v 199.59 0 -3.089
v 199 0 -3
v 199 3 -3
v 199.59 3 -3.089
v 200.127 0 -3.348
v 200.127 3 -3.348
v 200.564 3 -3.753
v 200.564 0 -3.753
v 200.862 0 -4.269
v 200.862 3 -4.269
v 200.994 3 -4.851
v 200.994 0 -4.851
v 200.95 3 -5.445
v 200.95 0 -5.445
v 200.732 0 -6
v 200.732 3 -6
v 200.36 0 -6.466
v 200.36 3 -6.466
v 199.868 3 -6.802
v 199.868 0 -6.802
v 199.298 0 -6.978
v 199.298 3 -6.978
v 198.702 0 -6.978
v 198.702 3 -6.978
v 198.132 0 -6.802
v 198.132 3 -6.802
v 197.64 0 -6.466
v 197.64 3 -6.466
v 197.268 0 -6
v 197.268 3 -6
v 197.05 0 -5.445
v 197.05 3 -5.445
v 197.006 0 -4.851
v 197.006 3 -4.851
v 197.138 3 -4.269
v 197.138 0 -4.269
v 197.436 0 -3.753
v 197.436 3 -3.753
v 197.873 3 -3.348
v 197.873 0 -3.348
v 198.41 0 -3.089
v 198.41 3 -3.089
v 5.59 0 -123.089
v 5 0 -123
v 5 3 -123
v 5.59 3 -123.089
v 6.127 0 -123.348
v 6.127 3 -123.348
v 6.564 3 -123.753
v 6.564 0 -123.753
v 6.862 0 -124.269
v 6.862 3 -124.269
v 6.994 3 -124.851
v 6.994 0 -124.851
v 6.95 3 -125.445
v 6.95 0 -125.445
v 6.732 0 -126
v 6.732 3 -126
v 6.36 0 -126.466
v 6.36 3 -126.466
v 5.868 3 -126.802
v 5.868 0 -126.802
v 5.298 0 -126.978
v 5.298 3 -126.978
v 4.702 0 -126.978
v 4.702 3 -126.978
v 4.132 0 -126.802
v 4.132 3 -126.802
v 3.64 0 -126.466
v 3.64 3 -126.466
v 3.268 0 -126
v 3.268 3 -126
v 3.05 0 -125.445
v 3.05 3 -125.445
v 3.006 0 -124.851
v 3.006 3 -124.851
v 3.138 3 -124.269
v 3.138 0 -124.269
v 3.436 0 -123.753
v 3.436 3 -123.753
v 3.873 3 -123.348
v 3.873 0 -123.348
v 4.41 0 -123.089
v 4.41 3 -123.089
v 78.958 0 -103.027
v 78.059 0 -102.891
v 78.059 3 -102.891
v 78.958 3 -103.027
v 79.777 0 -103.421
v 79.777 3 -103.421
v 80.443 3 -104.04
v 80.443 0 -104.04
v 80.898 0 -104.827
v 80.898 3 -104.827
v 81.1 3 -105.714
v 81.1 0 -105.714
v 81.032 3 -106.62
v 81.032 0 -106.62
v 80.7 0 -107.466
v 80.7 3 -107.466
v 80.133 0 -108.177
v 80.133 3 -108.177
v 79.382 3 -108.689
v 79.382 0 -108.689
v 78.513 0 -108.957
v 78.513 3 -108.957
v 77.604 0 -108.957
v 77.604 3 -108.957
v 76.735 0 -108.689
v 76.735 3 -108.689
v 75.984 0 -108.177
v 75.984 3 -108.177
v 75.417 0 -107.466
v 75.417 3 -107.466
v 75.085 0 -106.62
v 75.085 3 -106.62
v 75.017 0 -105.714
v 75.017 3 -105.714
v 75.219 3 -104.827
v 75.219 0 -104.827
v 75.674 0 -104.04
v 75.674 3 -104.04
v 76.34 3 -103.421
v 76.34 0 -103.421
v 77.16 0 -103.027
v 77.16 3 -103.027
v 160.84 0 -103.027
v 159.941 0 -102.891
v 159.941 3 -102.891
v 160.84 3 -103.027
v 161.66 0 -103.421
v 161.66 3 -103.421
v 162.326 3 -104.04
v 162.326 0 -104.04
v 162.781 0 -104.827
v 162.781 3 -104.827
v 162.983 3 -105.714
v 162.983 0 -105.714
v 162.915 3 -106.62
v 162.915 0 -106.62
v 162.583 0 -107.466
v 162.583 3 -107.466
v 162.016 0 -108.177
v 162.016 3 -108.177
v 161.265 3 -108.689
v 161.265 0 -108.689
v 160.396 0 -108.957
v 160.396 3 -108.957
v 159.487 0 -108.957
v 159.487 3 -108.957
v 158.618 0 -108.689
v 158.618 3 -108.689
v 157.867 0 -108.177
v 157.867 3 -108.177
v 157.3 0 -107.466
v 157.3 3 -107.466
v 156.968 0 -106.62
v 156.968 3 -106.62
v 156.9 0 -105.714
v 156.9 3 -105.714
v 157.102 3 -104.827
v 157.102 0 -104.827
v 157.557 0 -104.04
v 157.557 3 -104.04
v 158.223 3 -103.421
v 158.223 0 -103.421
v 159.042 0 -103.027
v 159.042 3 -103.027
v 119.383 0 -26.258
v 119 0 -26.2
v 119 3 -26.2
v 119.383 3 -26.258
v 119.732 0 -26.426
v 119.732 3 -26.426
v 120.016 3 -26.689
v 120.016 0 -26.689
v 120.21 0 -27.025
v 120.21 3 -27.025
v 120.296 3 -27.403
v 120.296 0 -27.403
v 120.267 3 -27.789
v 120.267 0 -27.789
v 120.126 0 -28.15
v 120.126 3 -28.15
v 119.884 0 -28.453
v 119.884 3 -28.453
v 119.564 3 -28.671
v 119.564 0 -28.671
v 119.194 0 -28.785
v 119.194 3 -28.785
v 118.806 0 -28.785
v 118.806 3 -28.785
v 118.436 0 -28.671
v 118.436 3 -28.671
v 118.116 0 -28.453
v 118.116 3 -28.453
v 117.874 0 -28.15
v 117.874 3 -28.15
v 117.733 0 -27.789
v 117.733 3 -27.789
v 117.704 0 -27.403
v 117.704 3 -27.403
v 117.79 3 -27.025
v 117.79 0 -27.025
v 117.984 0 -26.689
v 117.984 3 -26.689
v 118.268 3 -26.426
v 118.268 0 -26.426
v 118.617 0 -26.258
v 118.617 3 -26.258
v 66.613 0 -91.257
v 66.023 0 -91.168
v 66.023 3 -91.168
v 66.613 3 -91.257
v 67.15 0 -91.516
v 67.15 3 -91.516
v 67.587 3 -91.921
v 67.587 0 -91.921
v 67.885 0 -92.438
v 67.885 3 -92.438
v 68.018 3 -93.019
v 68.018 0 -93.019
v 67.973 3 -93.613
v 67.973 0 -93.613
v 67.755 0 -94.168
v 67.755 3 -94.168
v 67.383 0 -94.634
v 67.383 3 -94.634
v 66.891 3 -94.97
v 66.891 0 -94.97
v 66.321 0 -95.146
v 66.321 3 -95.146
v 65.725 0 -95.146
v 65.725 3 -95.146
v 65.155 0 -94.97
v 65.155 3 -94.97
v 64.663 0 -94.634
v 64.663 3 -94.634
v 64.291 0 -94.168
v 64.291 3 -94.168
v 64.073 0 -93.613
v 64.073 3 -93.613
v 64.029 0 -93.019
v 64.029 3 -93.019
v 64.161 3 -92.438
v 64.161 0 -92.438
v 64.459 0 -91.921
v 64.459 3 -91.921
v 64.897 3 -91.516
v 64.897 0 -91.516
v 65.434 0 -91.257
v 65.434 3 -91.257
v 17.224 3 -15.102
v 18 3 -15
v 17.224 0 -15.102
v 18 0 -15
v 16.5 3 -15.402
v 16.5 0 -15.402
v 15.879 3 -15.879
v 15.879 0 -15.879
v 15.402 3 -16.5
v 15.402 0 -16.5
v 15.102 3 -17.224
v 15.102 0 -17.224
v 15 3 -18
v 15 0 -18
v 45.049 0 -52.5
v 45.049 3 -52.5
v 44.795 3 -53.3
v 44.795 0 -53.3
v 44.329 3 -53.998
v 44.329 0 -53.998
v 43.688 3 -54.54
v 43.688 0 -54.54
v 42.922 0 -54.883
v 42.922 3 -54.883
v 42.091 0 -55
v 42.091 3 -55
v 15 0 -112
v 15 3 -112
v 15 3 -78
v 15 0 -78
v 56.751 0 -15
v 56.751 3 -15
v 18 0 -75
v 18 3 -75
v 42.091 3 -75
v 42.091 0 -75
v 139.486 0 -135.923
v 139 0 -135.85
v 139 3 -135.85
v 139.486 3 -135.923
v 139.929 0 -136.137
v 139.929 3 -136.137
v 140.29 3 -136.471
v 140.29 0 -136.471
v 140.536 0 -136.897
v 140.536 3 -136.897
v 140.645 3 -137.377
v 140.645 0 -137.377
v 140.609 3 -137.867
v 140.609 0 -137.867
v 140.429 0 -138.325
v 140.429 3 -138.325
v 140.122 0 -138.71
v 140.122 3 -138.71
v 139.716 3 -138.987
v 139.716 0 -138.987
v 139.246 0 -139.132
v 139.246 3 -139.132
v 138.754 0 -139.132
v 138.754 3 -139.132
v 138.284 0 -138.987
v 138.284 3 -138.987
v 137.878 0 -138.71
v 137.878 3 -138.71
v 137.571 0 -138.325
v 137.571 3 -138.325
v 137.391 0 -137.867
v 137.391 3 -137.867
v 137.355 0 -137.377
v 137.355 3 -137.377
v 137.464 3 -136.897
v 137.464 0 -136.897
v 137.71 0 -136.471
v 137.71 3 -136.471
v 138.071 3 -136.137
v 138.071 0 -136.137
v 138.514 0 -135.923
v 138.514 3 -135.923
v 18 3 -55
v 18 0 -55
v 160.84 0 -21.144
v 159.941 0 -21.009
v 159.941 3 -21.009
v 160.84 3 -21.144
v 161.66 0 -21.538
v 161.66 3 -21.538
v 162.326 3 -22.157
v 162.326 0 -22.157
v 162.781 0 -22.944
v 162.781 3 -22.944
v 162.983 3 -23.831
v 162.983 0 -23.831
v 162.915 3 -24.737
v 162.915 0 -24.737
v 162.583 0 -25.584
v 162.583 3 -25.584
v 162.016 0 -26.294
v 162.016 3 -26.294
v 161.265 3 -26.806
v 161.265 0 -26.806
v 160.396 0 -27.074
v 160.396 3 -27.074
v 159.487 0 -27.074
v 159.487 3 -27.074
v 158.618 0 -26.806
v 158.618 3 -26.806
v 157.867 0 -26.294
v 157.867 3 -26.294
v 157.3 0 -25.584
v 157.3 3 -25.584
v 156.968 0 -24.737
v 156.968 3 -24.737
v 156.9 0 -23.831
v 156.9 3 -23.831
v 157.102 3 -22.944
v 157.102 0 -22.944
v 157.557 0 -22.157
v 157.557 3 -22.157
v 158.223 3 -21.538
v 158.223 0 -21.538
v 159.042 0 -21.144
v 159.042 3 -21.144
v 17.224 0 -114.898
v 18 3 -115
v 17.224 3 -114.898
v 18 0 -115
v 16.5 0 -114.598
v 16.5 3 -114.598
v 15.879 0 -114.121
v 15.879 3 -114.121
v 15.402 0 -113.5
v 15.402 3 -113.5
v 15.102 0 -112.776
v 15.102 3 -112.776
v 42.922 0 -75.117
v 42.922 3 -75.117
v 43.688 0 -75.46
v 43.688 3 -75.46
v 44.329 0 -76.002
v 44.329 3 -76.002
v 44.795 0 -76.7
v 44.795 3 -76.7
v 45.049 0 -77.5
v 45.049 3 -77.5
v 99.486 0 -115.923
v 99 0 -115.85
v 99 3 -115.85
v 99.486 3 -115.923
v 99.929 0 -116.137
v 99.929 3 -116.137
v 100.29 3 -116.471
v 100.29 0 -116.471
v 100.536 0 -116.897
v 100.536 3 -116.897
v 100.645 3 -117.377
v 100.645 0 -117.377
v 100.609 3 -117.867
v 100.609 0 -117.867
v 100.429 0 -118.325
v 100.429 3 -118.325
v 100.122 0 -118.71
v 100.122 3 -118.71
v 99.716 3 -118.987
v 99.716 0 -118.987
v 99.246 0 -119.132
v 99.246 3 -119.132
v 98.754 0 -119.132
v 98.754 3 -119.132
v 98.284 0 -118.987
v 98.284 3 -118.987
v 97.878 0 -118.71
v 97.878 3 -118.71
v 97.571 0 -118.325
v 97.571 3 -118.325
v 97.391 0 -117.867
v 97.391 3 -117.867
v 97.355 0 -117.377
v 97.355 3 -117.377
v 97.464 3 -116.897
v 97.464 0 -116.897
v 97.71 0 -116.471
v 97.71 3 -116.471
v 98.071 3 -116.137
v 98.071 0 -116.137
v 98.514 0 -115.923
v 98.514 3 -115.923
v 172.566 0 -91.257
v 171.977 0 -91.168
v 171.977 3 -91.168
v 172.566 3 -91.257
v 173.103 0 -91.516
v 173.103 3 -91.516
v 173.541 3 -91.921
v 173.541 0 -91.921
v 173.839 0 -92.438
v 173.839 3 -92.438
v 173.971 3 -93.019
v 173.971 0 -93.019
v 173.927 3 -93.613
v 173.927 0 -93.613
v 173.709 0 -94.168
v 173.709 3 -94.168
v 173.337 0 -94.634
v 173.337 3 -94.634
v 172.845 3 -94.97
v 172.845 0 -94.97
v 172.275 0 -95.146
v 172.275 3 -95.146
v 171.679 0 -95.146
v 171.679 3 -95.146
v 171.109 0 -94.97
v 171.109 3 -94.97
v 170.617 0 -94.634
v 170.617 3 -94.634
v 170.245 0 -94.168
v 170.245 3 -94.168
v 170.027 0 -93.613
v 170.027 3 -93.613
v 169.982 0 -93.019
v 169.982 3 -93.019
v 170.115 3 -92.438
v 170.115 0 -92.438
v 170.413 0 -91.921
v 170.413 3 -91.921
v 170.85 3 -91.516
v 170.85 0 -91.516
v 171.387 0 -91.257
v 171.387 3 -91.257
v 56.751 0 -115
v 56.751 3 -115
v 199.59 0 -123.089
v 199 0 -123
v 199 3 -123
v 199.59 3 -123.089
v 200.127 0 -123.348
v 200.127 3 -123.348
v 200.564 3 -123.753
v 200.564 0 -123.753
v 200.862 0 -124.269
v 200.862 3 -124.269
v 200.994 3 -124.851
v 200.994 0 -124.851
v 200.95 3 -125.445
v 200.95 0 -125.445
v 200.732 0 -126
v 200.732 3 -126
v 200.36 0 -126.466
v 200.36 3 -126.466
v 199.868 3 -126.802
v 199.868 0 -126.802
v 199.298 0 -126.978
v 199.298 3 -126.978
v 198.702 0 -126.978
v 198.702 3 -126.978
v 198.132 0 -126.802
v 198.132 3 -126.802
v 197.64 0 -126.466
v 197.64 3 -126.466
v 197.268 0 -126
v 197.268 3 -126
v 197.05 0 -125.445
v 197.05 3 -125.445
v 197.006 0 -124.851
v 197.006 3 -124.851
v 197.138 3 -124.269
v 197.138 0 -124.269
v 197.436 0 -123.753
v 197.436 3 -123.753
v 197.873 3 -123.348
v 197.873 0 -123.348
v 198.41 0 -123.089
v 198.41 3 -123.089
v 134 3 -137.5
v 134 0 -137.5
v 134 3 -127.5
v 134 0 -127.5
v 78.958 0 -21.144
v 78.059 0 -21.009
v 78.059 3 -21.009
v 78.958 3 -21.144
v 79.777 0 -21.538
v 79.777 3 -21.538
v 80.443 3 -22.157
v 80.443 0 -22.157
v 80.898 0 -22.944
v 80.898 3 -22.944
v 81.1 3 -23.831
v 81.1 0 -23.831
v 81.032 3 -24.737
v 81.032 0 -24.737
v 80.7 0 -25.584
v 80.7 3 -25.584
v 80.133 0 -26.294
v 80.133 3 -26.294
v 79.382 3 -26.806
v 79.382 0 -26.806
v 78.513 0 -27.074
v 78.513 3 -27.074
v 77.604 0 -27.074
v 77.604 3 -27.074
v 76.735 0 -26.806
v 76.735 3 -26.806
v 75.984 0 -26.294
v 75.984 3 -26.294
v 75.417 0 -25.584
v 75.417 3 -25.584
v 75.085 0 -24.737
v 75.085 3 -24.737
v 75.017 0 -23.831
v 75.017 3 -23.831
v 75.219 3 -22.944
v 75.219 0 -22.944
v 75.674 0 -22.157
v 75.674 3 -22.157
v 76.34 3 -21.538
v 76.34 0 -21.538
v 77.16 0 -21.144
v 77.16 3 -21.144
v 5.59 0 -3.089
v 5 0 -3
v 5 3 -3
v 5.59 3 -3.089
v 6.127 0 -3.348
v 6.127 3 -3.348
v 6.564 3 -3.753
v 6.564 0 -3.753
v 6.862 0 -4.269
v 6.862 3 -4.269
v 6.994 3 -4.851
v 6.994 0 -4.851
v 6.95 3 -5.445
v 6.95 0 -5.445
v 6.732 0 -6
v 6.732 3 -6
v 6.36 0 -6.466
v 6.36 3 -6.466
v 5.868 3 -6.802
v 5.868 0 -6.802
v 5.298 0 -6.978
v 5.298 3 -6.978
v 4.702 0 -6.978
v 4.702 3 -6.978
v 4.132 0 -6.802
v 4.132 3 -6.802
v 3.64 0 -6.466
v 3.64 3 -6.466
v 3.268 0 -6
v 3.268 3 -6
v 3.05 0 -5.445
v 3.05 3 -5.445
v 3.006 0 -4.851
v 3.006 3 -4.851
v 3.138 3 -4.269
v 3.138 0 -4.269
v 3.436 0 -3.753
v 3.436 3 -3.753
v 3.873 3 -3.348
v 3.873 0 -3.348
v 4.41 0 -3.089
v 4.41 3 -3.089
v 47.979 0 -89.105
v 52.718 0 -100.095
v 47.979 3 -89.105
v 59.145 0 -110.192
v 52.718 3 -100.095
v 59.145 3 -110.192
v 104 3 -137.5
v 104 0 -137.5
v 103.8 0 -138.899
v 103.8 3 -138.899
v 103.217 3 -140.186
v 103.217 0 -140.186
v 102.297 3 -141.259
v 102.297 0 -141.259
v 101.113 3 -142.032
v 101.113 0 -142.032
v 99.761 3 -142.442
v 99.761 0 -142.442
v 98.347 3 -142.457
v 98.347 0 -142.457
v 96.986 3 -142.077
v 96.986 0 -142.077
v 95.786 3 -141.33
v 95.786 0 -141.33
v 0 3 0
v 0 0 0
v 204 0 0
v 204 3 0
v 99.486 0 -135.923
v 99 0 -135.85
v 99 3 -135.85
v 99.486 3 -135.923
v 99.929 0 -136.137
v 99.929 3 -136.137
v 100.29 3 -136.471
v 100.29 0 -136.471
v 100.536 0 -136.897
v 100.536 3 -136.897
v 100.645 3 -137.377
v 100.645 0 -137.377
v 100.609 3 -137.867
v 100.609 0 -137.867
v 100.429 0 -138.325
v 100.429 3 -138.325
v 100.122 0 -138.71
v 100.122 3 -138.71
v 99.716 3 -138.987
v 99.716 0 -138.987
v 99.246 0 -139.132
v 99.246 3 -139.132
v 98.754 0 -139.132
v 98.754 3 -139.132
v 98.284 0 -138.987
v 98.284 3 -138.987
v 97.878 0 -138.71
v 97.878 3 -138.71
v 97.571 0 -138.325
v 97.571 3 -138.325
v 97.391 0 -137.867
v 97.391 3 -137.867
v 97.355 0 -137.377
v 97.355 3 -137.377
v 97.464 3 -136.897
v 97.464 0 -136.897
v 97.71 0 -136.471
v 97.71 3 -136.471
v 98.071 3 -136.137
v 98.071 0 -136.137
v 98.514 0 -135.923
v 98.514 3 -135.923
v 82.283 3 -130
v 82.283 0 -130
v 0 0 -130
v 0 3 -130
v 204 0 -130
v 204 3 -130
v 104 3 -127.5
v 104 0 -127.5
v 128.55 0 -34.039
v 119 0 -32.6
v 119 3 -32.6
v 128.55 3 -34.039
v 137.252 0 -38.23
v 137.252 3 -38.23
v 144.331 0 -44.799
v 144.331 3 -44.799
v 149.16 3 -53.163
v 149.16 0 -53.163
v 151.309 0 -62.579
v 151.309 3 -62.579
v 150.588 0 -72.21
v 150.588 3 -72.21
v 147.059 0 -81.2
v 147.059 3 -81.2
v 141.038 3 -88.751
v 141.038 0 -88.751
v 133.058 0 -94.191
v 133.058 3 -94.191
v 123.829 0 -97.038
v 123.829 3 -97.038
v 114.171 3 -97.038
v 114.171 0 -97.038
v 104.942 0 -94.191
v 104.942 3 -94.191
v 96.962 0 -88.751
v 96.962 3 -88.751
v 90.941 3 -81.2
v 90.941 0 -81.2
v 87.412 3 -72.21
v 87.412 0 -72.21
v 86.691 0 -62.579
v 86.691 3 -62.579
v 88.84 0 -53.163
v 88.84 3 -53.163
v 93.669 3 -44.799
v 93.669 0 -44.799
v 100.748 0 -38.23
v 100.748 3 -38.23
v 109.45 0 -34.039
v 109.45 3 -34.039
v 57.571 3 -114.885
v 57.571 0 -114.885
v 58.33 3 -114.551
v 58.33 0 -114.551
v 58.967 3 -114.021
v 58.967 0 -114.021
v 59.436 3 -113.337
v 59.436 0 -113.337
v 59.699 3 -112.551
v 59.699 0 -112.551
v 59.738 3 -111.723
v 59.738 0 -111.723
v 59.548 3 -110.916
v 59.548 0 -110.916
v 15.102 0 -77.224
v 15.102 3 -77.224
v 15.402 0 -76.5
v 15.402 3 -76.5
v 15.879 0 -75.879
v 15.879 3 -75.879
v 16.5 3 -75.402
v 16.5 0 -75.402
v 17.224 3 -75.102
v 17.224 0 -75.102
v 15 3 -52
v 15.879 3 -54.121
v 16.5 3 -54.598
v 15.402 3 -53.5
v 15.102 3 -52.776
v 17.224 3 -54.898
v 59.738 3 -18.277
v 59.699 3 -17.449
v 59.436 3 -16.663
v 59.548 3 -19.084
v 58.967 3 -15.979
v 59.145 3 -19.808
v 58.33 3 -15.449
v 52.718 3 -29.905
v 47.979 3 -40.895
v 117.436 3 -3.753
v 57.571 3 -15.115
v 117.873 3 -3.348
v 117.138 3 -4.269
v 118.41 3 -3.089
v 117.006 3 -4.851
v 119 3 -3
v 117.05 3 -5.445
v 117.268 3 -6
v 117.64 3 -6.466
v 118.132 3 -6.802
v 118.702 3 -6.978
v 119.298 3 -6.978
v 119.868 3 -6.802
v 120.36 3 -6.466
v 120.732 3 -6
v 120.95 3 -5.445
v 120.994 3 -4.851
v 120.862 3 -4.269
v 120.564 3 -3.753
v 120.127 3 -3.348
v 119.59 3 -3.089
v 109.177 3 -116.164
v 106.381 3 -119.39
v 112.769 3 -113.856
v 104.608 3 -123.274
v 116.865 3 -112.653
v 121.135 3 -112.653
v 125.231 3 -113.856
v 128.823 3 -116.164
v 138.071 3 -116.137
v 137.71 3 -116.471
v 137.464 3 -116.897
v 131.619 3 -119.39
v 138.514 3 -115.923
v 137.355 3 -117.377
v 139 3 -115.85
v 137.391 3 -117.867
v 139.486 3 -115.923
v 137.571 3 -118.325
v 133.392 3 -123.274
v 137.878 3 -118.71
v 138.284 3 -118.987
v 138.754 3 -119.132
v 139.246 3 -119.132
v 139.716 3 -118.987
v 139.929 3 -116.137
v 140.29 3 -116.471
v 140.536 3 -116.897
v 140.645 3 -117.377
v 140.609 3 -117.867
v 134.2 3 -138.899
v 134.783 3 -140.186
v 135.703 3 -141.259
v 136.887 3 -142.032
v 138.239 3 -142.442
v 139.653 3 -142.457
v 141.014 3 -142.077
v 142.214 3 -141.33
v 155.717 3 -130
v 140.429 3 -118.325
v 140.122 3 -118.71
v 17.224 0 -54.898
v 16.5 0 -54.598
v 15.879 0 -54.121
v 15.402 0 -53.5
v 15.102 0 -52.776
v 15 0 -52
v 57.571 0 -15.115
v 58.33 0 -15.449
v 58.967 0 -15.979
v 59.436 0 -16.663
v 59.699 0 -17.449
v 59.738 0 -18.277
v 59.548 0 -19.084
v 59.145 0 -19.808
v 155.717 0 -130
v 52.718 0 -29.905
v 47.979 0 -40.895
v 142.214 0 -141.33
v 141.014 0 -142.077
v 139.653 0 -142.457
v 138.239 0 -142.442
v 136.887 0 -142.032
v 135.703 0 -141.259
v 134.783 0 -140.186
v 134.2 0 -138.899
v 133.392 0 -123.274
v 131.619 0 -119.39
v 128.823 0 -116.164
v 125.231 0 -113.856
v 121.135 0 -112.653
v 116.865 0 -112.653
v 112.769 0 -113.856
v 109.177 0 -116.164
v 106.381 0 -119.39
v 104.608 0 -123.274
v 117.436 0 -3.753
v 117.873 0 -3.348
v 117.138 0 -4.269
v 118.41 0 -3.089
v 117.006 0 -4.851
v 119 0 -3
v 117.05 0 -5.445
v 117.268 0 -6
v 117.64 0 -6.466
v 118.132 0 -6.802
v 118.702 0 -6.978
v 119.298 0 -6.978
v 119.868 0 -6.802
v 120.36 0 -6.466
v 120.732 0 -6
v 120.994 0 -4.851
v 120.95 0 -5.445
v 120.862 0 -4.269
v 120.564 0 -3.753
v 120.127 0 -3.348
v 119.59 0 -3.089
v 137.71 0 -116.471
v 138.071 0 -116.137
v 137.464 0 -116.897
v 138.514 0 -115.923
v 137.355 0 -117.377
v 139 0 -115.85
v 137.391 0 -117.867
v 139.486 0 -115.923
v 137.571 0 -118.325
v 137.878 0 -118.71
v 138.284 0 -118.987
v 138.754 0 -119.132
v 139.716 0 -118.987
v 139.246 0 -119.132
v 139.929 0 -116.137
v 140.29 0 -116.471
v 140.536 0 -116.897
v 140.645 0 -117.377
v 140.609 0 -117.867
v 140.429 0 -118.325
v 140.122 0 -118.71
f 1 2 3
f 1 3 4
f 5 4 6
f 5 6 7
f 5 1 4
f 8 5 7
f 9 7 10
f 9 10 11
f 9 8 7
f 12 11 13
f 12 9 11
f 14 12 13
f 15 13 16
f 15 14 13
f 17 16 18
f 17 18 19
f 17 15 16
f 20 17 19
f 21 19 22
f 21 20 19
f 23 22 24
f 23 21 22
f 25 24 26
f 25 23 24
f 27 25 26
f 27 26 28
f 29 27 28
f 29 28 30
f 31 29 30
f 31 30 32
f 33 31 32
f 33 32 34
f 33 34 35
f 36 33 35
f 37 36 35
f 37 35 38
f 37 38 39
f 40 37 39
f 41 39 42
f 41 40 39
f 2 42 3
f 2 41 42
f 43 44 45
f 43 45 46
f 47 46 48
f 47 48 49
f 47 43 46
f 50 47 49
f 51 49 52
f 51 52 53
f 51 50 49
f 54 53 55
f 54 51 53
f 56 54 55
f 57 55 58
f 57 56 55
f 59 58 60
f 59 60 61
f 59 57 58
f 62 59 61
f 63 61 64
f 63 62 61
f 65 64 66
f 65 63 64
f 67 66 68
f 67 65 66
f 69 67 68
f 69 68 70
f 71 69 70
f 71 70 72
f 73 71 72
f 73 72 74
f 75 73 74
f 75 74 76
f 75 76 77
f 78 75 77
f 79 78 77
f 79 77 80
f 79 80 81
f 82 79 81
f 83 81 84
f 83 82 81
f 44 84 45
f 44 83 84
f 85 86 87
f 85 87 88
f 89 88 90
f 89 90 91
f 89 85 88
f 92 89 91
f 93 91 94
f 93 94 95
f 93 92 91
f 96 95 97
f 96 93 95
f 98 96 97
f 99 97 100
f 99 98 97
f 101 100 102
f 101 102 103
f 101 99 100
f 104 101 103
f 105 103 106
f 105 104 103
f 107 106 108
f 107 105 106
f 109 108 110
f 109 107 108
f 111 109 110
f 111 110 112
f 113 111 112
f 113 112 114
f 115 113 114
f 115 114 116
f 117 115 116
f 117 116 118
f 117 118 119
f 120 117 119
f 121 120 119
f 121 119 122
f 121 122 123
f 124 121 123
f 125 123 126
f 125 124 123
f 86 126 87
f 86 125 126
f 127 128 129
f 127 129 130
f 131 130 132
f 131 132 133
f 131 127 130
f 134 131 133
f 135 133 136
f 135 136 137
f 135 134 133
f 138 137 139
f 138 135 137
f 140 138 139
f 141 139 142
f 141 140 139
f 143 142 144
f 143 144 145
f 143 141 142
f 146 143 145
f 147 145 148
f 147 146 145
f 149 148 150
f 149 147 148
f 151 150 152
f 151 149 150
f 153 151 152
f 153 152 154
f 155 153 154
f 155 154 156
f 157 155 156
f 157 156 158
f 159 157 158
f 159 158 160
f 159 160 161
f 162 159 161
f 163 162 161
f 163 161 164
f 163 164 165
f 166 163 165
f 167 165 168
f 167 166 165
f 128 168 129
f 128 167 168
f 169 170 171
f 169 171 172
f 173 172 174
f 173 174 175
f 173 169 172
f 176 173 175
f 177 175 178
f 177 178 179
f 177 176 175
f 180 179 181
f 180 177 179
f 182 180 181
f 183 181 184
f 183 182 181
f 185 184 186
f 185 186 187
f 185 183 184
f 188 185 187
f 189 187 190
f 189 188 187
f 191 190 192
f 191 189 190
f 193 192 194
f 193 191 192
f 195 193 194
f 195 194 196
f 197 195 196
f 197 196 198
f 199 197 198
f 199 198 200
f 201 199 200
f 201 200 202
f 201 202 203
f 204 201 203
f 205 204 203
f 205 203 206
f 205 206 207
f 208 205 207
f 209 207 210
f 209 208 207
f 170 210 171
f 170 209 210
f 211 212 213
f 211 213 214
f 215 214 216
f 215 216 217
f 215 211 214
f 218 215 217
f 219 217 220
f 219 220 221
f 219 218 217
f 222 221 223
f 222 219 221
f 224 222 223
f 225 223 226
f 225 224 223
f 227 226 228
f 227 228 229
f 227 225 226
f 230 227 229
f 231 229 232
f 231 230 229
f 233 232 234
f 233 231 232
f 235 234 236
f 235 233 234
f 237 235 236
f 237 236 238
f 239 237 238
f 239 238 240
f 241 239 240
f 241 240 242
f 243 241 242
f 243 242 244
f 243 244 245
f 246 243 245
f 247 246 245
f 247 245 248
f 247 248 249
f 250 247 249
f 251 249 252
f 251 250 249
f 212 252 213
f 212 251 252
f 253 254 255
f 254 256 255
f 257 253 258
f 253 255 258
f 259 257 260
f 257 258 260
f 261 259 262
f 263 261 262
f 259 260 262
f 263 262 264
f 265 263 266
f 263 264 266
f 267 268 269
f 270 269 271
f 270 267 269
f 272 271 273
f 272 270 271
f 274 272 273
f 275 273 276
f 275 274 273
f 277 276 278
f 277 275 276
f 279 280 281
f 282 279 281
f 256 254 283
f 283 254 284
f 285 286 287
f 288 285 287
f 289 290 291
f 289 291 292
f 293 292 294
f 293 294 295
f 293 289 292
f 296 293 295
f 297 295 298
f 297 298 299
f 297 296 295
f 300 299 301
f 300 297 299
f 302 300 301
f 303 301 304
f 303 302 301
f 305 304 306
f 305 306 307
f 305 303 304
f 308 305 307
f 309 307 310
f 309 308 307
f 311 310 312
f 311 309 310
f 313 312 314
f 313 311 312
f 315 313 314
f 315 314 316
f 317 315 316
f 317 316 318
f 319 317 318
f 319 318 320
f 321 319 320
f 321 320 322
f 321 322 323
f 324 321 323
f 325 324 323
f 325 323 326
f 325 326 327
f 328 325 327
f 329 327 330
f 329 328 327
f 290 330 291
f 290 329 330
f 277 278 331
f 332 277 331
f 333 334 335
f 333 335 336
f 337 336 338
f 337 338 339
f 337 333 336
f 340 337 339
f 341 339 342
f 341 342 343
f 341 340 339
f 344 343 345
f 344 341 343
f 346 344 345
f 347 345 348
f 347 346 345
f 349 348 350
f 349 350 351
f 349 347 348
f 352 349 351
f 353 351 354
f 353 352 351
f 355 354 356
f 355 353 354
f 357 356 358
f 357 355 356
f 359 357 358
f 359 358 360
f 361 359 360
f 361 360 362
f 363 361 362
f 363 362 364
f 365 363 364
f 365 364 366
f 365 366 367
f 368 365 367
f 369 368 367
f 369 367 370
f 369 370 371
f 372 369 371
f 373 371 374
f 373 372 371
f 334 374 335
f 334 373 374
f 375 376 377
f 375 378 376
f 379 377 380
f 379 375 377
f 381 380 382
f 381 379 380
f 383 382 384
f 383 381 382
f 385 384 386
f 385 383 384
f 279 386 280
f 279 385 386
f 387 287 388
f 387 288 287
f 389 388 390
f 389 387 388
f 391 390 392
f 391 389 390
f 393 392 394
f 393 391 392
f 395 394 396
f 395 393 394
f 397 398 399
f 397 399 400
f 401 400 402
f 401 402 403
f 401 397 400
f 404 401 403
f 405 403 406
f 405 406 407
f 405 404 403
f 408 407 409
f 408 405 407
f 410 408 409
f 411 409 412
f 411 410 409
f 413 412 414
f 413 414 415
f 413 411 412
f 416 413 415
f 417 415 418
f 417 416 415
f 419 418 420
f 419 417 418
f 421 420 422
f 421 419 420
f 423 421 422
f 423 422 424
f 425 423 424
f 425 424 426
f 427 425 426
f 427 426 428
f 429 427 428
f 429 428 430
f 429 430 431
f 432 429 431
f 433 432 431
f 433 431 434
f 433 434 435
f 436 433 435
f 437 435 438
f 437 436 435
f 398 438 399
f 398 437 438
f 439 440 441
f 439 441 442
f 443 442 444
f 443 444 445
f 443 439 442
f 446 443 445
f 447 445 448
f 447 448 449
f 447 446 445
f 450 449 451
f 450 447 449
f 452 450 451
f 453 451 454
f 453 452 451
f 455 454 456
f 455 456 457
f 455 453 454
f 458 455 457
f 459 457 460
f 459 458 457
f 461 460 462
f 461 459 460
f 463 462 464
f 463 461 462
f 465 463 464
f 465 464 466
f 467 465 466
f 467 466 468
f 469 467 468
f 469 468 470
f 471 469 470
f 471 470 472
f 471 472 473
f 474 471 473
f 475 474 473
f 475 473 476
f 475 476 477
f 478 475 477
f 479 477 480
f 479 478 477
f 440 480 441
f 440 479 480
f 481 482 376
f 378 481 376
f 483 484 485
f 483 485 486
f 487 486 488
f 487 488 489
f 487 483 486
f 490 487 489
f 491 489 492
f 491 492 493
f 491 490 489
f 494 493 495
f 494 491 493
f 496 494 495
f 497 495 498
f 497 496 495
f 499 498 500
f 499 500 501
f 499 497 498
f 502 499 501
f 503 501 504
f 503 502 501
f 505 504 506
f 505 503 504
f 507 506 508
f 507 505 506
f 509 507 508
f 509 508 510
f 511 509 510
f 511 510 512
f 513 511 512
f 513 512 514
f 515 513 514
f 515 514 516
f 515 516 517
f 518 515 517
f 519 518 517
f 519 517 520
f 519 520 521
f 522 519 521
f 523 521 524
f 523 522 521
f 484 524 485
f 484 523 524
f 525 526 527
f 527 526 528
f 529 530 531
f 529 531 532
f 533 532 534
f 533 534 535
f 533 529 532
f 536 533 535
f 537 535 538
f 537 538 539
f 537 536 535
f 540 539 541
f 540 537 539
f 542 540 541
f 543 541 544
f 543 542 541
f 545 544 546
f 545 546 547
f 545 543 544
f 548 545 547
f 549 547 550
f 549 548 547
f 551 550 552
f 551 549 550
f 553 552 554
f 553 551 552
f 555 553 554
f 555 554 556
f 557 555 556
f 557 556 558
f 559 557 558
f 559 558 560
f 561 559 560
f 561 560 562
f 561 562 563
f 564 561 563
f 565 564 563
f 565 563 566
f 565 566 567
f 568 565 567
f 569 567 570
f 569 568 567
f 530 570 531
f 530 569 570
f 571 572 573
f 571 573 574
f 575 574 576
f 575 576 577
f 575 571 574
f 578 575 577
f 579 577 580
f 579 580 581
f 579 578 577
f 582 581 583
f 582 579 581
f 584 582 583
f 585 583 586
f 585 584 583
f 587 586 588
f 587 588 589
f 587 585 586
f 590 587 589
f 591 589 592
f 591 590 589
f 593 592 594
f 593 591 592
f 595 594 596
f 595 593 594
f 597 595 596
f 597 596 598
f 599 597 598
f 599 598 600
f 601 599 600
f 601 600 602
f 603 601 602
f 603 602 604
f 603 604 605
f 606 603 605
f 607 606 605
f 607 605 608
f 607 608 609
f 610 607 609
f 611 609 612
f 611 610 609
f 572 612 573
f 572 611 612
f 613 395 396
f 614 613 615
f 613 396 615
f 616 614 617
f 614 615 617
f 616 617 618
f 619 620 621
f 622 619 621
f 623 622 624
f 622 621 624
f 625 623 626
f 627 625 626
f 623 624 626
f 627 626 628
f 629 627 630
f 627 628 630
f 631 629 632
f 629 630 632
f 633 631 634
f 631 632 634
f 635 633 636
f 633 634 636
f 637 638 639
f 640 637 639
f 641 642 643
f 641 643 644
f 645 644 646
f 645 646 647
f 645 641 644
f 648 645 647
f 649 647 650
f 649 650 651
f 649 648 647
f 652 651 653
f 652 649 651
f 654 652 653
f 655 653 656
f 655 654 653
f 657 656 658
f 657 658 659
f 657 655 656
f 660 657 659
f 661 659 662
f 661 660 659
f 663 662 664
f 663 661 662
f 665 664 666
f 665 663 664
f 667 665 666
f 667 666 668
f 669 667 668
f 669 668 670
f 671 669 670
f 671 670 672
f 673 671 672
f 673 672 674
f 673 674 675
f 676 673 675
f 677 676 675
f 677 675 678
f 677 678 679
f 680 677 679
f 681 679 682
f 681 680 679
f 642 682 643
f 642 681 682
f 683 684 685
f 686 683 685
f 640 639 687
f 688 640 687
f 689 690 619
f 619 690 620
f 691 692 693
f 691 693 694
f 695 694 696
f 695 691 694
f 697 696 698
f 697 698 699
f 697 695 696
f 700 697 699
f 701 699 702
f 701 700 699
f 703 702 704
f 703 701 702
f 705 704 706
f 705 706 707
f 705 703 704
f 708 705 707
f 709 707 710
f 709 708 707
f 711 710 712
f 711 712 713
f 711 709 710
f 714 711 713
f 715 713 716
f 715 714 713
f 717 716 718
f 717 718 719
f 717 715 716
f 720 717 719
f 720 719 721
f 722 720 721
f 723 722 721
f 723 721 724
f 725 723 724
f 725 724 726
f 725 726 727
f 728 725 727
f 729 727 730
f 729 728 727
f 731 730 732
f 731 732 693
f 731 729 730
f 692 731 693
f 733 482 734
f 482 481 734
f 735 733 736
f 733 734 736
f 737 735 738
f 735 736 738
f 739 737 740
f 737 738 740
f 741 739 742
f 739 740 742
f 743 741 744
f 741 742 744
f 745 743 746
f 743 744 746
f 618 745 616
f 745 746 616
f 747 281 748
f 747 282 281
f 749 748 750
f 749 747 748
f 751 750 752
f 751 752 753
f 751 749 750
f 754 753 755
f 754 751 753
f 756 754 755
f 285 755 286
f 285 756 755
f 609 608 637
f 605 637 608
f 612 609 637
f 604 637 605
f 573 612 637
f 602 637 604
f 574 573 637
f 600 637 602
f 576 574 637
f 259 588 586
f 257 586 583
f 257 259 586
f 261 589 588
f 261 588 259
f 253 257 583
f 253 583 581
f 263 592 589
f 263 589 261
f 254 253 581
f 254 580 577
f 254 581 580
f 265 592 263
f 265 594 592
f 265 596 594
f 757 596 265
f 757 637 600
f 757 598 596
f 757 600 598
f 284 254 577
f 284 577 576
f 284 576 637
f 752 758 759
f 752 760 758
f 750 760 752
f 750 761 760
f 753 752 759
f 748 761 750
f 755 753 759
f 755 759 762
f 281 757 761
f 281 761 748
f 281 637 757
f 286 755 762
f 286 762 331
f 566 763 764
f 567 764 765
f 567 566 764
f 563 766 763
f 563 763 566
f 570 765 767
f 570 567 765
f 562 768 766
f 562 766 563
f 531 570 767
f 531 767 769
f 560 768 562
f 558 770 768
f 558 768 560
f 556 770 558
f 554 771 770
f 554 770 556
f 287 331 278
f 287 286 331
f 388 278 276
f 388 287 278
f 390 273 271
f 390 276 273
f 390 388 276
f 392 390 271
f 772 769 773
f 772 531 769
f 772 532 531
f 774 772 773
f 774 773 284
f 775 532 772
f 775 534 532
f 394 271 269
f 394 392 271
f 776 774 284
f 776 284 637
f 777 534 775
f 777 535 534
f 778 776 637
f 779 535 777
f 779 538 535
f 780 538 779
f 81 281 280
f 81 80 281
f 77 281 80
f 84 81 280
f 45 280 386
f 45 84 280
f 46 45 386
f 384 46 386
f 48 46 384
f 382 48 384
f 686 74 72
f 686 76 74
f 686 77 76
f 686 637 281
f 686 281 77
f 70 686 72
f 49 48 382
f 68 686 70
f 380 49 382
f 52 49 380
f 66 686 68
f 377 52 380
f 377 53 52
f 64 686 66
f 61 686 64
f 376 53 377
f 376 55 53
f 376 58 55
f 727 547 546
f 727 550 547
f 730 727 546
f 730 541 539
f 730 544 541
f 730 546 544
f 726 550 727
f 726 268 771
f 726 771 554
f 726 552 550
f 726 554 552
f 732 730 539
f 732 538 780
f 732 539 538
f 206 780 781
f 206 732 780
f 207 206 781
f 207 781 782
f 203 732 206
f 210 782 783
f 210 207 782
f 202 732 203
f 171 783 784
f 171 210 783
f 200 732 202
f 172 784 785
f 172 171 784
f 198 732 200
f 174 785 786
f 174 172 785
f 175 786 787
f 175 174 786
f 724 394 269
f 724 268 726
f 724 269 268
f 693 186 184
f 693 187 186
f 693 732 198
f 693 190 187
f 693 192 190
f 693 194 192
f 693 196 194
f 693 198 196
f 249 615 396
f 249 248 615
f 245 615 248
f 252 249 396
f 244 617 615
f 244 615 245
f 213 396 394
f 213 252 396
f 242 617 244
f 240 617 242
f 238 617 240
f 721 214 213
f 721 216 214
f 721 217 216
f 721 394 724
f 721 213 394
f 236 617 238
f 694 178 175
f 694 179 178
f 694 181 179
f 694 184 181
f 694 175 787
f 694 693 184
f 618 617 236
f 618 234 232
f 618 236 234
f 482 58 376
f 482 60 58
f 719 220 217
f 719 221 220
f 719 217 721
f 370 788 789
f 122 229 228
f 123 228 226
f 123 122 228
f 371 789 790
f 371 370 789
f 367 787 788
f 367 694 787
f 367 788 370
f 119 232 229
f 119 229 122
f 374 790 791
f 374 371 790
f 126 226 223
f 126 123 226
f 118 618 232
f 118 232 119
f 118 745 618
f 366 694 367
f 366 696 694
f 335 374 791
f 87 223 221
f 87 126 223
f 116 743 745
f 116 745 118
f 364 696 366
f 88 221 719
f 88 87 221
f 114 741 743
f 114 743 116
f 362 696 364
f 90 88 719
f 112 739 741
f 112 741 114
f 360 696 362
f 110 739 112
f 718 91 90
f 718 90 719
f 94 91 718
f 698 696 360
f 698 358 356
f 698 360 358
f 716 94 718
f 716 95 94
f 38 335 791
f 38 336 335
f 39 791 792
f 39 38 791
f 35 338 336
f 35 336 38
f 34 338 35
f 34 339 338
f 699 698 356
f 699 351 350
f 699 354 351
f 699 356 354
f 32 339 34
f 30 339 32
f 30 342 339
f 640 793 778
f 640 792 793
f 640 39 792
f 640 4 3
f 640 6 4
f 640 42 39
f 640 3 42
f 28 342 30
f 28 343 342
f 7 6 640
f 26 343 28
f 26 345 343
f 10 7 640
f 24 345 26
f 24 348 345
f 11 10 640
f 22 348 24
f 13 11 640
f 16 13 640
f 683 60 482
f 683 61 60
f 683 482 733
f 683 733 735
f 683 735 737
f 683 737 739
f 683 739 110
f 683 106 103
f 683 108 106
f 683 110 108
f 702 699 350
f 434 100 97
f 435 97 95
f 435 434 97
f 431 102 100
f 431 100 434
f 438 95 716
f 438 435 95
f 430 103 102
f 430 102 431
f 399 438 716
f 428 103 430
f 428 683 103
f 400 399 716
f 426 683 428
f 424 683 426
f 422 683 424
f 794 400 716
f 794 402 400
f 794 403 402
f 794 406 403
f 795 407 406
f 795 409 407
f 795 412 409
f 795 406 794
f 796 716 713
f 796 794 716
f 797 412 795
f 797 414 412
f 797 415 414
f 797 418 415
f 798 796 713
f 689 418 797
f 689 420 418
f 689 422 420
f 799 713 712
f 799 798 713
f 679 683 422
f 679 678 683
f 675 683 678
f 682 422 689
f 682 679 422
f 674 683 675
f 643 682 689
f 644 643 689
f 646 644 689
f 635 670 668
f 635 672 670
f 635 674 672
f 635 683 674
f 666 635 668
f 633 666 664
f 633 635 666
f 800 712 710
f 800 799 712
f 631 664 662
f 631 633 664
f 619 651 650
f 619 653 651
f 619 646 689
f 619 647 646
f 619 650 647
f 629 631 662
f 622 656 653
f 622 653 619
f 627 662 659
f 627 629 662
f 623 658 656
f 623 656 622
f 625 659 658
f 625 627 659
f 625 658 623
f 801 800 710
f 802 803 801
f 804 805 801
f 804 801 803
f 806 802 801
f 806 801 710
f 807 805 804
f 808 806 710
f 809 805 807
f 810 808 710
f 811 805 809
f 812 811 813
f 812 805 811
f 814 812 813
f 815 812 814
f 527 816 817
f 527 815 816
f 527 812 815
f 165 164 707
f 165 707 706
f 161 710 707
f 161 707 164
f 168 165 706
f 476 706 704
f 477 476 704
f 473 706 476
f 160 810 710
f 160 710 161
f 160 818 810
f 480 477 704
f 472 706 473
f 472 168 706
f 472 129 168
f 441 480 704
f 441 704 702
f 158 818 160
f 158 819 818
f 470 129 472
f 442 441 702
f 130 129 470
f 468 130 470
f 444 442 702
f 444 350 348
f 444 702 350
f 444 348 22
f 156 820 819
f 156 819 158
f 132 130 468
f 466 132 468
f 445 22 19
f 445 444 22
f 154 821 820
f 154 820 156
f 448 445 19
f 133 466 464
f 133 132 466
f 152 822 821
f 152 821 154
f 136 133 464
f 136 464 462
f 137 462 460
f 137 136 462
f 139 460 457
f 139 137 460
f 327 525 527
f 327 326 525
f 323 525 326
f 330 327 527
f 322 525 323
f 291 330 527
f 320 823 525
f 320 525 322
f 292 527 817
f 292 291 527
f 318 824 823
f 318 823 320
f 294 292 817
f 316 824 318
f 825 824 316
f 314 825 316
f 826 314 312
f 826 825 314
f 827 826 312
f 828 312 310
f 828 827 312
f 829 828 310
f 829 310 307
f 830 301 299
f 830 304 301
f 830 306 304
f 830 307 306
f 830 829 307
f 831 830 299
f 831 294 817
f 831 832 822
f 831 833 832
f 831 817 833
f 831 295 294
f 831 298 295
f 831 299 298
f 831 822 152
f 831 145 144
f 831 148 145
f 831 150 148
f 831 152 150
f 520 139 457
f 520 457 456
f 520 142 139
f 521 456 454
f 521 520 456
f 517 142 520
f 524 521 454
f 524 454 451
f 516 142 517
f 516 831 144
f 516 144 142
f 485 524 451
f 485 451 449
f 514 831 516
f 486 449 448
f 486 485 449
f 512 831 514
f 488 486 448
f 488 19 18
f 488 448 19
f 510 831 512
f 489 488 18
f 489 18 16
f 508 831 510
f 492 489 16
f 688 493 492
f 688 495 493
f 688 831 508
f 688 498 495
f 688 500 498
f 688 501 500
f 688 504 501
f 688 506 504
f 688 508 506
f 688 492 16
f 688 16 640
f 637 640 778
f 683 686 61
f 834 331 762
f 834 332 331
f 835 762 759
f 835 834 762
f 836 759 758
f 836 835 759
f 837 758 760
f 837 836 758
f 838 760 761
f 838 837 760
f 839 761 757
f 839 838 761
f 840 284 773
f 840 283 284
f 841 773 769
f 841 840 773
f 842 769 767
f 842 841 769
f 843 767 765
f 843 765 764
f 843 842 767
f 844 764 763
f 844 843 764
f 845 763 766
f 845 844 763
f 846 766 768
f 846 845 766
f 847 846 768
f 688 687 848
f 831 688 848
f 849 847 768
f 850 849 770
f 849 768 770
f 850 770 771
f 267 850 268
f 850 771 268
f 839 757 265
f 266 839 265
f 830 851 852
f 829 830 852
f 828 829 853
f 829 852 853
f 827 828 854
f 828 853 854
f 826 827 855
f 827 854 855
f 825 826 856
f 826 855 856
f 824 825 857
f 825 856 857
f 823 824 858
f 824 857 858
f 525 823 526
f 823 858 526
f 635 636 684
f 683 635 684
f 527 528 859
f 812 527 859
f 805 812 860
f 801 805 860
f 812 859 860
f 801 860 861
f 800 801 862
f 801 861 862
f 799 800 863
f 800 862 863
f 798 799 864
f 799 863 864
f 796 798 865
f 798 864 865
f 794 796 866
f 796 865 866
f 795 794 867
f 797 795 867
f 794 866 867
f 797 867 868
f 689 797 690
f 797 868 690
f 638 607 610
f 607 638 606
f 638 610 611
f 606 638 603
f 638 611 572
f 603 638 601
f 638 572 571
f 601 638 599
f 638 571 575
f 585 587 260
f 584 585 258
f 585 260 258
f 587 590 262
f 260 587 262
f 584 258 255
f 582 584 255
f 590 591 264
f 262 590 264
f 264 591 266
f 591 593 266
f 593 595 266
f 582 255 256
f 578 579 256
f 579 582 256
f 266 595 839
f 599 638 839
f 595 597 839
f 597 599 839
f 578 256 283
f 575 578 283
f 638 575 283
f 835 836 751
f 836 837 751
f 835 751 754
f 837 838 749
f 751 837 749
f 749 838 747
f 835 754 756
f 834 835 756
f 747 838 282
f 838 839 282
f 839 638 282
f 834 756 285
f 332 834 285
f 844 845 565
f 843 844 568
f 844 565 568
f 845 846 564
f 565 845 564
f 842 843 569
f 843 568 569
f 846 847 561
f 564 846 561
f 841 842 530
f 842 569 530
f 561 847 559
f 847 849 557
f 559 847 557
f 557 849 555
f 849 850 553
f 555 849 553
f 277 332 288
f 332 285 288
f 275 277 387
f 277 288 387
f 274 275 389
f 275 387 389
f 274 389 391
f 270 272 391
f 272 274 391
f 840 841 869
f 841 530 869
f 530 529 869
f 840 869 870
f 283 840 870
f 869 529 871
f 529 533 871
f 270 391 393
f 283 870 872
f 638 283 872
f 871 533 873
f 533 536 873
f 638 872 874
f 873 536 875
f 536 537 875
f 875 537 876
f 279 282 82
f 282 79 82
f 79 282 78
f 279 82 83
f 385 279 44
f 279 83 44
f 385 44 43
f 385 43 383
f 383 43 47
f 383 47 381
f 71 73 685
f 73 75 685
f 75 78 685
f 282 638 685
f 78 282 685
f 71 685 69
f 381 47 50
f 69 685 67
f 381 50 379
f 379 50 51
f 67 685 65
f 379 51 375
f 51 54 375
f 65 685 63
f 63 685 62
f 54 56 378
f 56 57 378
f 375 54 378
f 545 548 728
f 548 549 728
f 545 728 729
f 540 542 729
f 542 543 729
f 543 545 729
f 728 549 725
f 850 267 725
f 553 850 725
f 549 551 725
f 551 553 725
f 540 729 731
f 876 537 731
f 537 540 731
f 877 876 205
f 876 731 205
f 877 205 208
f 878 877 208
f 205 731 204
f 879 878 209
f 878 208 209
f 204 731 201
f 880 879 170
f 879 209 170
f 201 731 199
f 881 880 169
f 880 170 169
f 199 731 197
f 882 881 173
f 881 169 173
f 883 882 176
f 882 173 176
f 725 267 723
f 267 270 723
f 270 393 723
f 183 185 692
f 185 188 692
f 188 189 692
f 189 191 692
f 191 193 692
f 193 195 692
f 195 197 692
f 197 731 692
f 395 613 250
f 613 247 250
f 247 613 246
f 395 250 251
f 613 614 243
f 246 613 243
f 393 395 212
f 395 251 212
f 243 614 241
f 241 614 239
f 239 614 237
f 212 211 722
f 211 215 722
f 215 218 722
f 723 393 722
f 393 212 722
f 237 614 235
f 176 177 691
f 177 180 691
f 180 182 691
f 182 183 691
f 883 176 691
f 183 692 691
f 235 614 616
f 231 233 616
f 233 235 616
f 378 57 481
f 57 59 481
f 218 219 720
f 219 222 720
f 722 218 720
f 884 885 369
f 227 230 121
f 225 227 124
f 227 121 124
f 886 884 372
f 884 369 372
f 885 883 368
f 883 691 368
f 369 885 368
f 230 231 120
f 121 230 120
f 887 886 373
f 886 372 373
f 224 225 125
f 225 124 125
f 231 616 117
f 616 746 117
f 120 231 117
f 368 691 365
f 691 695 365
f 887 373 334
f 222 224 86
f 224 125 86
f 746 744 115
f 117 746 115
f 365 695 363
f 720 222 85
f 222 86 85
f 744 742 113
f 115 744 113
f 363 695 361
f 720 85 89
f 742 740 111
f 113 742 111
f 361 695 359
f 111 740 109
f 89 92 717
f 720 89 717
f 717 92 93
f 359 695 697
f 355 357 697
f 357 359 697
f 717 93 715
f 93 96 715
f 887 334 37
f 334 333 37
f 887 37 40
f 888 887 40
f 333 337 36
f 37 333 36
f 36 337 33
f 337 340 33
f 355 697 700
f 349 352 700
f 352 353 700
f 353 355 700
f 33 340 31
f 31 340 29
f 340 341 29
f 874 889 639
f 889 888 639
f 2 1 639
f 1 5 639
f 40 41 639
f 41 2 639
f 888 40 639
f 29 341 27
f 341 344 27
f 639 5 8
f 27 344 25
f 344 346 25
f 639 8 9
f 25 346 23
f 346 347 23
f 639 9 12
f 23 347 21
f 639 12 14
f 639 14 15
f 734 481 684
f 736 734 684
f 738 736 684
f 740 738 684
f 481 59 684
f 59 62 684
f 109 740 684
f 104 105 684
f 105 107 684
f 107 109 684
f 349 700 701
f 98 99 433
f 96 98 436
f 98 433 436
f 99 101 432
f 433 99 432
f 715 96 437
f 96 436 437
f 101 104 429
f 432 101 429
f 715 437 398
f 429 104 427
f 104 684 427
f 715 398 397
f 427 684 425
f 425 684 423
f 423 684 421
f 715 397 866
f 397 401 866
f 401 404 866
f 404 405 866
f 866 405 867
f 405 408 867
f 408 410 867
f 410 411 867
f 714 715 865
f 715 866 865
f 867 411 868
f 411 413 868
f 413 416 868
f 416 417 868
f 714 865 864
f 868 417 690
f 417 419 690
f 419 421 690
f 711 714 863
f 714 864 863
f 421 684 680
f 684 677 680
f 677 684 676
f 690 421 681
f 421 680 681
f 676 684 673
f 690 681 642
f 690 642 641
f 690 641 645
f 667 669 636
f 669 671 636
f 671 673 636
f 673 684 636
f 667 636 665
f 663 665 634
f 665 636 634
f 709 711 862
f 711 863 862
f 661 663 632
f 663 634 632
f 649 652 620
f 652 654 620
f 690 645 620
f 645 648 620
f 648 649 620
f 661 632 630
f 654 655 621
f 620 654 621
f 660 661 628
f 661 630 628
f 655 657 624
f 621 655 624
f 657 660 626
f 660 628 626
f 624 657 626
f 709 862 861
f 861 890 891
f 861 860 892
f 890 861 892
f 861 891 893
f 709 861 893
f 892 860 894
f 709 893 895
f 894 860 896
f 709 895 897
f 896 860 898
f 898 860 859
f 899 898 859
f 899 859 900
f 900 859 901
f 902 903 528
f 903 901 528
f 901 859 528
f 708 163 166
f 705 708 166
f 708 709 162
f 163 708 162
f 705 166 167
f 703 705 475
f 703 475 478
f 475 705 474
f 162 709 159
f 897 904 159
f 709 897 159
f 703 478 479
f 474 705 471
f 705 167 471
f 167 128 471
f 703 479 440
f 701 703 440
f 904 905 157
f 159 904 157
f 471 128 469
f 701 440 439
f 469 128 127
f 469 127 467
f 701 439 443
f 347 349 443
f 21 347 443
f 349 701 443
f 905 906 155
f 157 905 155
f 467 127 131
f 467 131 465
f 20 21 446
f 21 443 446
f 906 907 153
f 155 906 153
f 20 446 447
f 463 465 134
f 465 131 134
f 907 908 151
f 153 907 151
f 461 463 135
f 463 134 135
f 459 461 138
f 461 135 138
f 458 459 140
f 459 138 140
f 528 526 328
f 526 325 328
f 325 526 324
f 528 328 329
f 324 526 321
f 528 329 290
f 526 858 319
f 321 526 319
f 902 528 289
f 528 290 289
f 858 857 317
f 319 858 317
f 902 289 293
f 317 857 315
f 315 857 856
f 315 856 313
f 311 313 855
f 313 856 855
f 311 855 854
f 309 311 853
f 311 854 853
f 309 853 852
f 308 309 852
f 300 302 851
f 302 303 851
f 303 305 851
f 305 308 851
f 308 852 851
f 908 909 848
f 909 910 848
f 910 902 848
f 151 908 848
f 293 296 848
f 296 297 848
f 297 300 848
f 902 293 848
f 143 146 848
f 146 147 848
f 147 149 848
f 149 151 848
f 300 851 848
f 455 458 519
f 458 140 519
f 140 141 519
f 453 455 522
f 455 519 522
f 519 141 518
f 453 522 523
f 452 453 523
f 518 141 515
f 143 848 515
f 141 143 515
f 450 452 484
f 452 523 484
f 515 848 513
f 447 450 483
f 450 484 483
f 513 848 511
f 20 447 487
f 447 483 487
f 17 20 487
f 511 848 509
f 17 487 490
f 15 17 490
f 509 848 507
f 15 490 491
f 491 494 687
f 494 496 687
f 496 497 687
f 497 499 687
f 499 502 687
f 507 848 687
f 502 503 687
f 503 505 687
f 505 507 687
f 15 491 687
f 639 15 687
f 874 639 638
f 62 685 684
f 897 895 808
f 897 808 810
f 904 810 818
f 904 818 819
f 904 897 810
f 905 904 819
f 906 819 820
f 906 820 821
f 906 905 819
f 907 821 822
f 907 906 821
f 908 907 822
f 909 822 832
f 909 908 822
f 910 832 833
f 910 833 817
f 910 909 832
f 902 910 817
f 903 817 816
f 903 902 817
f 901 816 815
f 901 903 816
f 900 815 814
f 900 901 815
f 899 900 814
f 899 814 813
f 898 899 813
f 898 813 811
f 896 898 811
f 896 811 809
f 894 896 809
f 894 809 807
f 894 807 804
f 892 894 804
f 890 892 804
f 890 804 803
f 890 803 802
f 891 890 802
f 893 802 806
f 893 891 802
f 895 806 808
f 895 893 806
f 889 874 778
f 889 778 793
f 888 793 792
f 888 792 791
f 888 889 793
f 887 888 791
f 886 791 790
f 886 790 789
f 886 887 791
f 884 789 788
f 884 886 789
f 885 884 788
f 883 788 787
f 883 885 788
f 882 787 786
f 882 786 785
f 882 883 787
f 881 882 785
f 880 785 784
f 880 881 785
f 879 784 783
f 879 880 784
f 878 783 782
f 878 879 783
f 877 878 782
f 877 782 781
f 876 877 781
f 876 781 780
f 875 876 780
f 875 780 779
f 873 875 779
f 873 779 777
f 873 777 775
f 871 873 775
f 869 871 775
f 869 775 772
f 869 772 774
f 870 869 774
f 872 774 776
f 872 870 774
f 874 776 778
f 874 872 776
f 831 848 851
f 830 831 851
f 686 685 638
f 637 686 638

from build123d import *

# Parameters (mm, degrees)
SKETCH_1_R          = 2
SKETCH_1_R_2        = 3.05
SKETCH_1_R_3        = 1.3
SKETCH_1_R_4        = 32.4
SKETCH_1_R_5        = 1.65
EXTRUDE_1_DEPTH     = 3
CUT_EXTRUDE_1_DEPTH = 249.859900346
FILLET_1_R          = 3


with BuildPart() as part:
    # ｽｹｯﾁ1 → ﾎﾞｽ - 押し出し1 (new body)
    with BuildSketch(Plane(origin=(0, 0, 0), x_dir=(1, 0, 0), z_dir=(0, 1, 0))):
        with BuildLine():
            Line((0, 130), (0, 0))
            Line((0, 0), (204, 0))
            Line((204, 0), (204, 130))
            Line((204, 130), (155.716771079, 130))
            Line((155.716771079, 130), (142.213938048, 141.330222216))
            ThreePointArc((142.213938048, 141.330222216), (136.886908691, 142.031538935), (134, 137.5))
            Line((134, 137.5), (134, 127.5))
            ThreePointArc((134, 127.5), (119, 112.5), (104, 127.5))
            Line((104, 127.5), (104, 130))
            Line((104, 130), (104, 137.5))
            ThreePointArc((104, 137.5), (101.113091309, 142.031538935), (95.786061952, 141.330222216))
            Line((95.786061952, 141.330222216), (82.283228921, 130))
            Line((82.283228921, 130), (0, 130))
        make_face()
        with Locations(Location((5, 5, 0), (0, 0, 270))):
            Circle(SKETCH_1_R, mode=Mode.SUBTRACT)
        with Locations(Location((78.058517369, 24.058517369, 0), (0, 0, 270))):
            Circle(SKETCH_1_R_2, mode=Mode.SUBTRACT)
        with Locations(Location((119, 5, 0), (0, 0, 270))):
            Circle(SKETCH_1_R, mode=Mode.SUBTRACT)
        with Locations(Location((119, 27.5, 0), (0, 0, 270))):
            Circle(SKETCH_1_R_3, mode=Mode.SUBTRACT)
        with Locations(Location((199, 5, 0), (0, 0, 270))):
            Circle(SKETCH_1_R, mode=Mode.SUBTRACT)
        with Locations(Location((159.941482631, 24.058517369, 0), (0, 0, 270))):
            Circle(SKETCH_1_R_2, mode=Mode.SUBTRACT)
        with Locations(Location((119, 65, 0), (0, 0, 270))):
            Circle(SKETCH_1_R_4, mode=Mode.SUBTRACT)
        with Locations(Location((66.023144428, 93.168293767, 0), (0, 0, 270))):
            Circle(SKETCH_1_R, mode=Mode.SUBTRACT)
        with Locations(Location((5, 125, 0), (0, 0, 270))):
            Circle(SKETCH_1_R, mode=Mode.SUBTRACT)
        with Locations(Location((78.058517369, 105.941482631, 0), (0, 0, 270))):
            Circle(SKETCH_1_R_2, mode=Mode.SUBTRACT)
        with Locations(Location((99, 117.5, 0), (0, 0, 270))):
            Circle(SKETCH_1_R_5, mode=Mode.SUBTRACT)
        with Locations(Location((99, 137.5, 0), (0, 0, 270))):
            Circle(SKETCH_1_R_5, mode=Mode.SUBTRACT)
        with Locations(Location((171.976855572, 93.168293767, 0), (0, 0, 270))):
            Circle(SKETCH_1_R, mode=Mode.SUBTRACT)
        with Locations(Location((139, 117.5, 0), (0, 0, 270))):
            Circle(SKETCH_1_R_5, mode=Mode.SUBTRACT)
        with Locations(Location((159.941482631, 105.941482631, 0), (0, 0, 270))):
            Circle(SKETCH_1_R_2, mode=Mode.SUBTRACT)
        with Locations(Location((199, 125, 0), (0, 0, 270))):
            Circle(SKETCH_1_R, mode=Mode.SUBTRACT)
        with Locations(Location((139, 137.5, 0), (0, 0, 270))):
            Circle(SKETCH_1_R_5, mode=Mode.SUBTRACT)
    extrude(amount=EXTRUDE_1_DEPTH)

    # ｽｹｯﾁ2 → ｶｯﾄ - 押し出し1 (cut, through all)
    with BuildSketch(Plane(origin=(0, 3, 0), x_dir=(1, 0, 0), z_dir=(0, 1, 0))):
        with BuildLine():
            ThreePointArc((44.669656263, 75), (50.881747913, 96.383175949), (63.098300563, 115))
            Line((63.098300563, 115), (15, 115))
            Line((15, 115), (15, 75))
            Line((15, 75), (44.669656263, 75))
        make_face()
        with BuildLine():
            Line((15, 15), (63.098300563, 15))
            ThreePointArc((63.098300563, 15), (50.881747913, 33.616824051), (44.669656263, 55))
            Line((44.669656263, 55), (15, 55))
            Line((15, 55), (15, 15))
        make_face()
    extrude(amount=-CUT_EXTRUDE_1_DEPTH, mode=Mode.SUBTRACT)

    # ﾌｨﾚｯﾄ1
    fillet_1_edges = [part.edges().sort_by_distance(p)[0] for p in [
        (63.098300563, 1.5, -115),
        (44.669656263, 1.5, -75),
        (15, 1.5, -75),
        (15, 1.5, -115),
        (44.669656263, 1.5, -55),
        (63.098300563, 1.5, -15),
        (15, 1.5, -15),
        (15, 1.5, -55),
    ]]
    fillet(fillet_1_edges, radius=FILLET_1_R)


solid = part.part
